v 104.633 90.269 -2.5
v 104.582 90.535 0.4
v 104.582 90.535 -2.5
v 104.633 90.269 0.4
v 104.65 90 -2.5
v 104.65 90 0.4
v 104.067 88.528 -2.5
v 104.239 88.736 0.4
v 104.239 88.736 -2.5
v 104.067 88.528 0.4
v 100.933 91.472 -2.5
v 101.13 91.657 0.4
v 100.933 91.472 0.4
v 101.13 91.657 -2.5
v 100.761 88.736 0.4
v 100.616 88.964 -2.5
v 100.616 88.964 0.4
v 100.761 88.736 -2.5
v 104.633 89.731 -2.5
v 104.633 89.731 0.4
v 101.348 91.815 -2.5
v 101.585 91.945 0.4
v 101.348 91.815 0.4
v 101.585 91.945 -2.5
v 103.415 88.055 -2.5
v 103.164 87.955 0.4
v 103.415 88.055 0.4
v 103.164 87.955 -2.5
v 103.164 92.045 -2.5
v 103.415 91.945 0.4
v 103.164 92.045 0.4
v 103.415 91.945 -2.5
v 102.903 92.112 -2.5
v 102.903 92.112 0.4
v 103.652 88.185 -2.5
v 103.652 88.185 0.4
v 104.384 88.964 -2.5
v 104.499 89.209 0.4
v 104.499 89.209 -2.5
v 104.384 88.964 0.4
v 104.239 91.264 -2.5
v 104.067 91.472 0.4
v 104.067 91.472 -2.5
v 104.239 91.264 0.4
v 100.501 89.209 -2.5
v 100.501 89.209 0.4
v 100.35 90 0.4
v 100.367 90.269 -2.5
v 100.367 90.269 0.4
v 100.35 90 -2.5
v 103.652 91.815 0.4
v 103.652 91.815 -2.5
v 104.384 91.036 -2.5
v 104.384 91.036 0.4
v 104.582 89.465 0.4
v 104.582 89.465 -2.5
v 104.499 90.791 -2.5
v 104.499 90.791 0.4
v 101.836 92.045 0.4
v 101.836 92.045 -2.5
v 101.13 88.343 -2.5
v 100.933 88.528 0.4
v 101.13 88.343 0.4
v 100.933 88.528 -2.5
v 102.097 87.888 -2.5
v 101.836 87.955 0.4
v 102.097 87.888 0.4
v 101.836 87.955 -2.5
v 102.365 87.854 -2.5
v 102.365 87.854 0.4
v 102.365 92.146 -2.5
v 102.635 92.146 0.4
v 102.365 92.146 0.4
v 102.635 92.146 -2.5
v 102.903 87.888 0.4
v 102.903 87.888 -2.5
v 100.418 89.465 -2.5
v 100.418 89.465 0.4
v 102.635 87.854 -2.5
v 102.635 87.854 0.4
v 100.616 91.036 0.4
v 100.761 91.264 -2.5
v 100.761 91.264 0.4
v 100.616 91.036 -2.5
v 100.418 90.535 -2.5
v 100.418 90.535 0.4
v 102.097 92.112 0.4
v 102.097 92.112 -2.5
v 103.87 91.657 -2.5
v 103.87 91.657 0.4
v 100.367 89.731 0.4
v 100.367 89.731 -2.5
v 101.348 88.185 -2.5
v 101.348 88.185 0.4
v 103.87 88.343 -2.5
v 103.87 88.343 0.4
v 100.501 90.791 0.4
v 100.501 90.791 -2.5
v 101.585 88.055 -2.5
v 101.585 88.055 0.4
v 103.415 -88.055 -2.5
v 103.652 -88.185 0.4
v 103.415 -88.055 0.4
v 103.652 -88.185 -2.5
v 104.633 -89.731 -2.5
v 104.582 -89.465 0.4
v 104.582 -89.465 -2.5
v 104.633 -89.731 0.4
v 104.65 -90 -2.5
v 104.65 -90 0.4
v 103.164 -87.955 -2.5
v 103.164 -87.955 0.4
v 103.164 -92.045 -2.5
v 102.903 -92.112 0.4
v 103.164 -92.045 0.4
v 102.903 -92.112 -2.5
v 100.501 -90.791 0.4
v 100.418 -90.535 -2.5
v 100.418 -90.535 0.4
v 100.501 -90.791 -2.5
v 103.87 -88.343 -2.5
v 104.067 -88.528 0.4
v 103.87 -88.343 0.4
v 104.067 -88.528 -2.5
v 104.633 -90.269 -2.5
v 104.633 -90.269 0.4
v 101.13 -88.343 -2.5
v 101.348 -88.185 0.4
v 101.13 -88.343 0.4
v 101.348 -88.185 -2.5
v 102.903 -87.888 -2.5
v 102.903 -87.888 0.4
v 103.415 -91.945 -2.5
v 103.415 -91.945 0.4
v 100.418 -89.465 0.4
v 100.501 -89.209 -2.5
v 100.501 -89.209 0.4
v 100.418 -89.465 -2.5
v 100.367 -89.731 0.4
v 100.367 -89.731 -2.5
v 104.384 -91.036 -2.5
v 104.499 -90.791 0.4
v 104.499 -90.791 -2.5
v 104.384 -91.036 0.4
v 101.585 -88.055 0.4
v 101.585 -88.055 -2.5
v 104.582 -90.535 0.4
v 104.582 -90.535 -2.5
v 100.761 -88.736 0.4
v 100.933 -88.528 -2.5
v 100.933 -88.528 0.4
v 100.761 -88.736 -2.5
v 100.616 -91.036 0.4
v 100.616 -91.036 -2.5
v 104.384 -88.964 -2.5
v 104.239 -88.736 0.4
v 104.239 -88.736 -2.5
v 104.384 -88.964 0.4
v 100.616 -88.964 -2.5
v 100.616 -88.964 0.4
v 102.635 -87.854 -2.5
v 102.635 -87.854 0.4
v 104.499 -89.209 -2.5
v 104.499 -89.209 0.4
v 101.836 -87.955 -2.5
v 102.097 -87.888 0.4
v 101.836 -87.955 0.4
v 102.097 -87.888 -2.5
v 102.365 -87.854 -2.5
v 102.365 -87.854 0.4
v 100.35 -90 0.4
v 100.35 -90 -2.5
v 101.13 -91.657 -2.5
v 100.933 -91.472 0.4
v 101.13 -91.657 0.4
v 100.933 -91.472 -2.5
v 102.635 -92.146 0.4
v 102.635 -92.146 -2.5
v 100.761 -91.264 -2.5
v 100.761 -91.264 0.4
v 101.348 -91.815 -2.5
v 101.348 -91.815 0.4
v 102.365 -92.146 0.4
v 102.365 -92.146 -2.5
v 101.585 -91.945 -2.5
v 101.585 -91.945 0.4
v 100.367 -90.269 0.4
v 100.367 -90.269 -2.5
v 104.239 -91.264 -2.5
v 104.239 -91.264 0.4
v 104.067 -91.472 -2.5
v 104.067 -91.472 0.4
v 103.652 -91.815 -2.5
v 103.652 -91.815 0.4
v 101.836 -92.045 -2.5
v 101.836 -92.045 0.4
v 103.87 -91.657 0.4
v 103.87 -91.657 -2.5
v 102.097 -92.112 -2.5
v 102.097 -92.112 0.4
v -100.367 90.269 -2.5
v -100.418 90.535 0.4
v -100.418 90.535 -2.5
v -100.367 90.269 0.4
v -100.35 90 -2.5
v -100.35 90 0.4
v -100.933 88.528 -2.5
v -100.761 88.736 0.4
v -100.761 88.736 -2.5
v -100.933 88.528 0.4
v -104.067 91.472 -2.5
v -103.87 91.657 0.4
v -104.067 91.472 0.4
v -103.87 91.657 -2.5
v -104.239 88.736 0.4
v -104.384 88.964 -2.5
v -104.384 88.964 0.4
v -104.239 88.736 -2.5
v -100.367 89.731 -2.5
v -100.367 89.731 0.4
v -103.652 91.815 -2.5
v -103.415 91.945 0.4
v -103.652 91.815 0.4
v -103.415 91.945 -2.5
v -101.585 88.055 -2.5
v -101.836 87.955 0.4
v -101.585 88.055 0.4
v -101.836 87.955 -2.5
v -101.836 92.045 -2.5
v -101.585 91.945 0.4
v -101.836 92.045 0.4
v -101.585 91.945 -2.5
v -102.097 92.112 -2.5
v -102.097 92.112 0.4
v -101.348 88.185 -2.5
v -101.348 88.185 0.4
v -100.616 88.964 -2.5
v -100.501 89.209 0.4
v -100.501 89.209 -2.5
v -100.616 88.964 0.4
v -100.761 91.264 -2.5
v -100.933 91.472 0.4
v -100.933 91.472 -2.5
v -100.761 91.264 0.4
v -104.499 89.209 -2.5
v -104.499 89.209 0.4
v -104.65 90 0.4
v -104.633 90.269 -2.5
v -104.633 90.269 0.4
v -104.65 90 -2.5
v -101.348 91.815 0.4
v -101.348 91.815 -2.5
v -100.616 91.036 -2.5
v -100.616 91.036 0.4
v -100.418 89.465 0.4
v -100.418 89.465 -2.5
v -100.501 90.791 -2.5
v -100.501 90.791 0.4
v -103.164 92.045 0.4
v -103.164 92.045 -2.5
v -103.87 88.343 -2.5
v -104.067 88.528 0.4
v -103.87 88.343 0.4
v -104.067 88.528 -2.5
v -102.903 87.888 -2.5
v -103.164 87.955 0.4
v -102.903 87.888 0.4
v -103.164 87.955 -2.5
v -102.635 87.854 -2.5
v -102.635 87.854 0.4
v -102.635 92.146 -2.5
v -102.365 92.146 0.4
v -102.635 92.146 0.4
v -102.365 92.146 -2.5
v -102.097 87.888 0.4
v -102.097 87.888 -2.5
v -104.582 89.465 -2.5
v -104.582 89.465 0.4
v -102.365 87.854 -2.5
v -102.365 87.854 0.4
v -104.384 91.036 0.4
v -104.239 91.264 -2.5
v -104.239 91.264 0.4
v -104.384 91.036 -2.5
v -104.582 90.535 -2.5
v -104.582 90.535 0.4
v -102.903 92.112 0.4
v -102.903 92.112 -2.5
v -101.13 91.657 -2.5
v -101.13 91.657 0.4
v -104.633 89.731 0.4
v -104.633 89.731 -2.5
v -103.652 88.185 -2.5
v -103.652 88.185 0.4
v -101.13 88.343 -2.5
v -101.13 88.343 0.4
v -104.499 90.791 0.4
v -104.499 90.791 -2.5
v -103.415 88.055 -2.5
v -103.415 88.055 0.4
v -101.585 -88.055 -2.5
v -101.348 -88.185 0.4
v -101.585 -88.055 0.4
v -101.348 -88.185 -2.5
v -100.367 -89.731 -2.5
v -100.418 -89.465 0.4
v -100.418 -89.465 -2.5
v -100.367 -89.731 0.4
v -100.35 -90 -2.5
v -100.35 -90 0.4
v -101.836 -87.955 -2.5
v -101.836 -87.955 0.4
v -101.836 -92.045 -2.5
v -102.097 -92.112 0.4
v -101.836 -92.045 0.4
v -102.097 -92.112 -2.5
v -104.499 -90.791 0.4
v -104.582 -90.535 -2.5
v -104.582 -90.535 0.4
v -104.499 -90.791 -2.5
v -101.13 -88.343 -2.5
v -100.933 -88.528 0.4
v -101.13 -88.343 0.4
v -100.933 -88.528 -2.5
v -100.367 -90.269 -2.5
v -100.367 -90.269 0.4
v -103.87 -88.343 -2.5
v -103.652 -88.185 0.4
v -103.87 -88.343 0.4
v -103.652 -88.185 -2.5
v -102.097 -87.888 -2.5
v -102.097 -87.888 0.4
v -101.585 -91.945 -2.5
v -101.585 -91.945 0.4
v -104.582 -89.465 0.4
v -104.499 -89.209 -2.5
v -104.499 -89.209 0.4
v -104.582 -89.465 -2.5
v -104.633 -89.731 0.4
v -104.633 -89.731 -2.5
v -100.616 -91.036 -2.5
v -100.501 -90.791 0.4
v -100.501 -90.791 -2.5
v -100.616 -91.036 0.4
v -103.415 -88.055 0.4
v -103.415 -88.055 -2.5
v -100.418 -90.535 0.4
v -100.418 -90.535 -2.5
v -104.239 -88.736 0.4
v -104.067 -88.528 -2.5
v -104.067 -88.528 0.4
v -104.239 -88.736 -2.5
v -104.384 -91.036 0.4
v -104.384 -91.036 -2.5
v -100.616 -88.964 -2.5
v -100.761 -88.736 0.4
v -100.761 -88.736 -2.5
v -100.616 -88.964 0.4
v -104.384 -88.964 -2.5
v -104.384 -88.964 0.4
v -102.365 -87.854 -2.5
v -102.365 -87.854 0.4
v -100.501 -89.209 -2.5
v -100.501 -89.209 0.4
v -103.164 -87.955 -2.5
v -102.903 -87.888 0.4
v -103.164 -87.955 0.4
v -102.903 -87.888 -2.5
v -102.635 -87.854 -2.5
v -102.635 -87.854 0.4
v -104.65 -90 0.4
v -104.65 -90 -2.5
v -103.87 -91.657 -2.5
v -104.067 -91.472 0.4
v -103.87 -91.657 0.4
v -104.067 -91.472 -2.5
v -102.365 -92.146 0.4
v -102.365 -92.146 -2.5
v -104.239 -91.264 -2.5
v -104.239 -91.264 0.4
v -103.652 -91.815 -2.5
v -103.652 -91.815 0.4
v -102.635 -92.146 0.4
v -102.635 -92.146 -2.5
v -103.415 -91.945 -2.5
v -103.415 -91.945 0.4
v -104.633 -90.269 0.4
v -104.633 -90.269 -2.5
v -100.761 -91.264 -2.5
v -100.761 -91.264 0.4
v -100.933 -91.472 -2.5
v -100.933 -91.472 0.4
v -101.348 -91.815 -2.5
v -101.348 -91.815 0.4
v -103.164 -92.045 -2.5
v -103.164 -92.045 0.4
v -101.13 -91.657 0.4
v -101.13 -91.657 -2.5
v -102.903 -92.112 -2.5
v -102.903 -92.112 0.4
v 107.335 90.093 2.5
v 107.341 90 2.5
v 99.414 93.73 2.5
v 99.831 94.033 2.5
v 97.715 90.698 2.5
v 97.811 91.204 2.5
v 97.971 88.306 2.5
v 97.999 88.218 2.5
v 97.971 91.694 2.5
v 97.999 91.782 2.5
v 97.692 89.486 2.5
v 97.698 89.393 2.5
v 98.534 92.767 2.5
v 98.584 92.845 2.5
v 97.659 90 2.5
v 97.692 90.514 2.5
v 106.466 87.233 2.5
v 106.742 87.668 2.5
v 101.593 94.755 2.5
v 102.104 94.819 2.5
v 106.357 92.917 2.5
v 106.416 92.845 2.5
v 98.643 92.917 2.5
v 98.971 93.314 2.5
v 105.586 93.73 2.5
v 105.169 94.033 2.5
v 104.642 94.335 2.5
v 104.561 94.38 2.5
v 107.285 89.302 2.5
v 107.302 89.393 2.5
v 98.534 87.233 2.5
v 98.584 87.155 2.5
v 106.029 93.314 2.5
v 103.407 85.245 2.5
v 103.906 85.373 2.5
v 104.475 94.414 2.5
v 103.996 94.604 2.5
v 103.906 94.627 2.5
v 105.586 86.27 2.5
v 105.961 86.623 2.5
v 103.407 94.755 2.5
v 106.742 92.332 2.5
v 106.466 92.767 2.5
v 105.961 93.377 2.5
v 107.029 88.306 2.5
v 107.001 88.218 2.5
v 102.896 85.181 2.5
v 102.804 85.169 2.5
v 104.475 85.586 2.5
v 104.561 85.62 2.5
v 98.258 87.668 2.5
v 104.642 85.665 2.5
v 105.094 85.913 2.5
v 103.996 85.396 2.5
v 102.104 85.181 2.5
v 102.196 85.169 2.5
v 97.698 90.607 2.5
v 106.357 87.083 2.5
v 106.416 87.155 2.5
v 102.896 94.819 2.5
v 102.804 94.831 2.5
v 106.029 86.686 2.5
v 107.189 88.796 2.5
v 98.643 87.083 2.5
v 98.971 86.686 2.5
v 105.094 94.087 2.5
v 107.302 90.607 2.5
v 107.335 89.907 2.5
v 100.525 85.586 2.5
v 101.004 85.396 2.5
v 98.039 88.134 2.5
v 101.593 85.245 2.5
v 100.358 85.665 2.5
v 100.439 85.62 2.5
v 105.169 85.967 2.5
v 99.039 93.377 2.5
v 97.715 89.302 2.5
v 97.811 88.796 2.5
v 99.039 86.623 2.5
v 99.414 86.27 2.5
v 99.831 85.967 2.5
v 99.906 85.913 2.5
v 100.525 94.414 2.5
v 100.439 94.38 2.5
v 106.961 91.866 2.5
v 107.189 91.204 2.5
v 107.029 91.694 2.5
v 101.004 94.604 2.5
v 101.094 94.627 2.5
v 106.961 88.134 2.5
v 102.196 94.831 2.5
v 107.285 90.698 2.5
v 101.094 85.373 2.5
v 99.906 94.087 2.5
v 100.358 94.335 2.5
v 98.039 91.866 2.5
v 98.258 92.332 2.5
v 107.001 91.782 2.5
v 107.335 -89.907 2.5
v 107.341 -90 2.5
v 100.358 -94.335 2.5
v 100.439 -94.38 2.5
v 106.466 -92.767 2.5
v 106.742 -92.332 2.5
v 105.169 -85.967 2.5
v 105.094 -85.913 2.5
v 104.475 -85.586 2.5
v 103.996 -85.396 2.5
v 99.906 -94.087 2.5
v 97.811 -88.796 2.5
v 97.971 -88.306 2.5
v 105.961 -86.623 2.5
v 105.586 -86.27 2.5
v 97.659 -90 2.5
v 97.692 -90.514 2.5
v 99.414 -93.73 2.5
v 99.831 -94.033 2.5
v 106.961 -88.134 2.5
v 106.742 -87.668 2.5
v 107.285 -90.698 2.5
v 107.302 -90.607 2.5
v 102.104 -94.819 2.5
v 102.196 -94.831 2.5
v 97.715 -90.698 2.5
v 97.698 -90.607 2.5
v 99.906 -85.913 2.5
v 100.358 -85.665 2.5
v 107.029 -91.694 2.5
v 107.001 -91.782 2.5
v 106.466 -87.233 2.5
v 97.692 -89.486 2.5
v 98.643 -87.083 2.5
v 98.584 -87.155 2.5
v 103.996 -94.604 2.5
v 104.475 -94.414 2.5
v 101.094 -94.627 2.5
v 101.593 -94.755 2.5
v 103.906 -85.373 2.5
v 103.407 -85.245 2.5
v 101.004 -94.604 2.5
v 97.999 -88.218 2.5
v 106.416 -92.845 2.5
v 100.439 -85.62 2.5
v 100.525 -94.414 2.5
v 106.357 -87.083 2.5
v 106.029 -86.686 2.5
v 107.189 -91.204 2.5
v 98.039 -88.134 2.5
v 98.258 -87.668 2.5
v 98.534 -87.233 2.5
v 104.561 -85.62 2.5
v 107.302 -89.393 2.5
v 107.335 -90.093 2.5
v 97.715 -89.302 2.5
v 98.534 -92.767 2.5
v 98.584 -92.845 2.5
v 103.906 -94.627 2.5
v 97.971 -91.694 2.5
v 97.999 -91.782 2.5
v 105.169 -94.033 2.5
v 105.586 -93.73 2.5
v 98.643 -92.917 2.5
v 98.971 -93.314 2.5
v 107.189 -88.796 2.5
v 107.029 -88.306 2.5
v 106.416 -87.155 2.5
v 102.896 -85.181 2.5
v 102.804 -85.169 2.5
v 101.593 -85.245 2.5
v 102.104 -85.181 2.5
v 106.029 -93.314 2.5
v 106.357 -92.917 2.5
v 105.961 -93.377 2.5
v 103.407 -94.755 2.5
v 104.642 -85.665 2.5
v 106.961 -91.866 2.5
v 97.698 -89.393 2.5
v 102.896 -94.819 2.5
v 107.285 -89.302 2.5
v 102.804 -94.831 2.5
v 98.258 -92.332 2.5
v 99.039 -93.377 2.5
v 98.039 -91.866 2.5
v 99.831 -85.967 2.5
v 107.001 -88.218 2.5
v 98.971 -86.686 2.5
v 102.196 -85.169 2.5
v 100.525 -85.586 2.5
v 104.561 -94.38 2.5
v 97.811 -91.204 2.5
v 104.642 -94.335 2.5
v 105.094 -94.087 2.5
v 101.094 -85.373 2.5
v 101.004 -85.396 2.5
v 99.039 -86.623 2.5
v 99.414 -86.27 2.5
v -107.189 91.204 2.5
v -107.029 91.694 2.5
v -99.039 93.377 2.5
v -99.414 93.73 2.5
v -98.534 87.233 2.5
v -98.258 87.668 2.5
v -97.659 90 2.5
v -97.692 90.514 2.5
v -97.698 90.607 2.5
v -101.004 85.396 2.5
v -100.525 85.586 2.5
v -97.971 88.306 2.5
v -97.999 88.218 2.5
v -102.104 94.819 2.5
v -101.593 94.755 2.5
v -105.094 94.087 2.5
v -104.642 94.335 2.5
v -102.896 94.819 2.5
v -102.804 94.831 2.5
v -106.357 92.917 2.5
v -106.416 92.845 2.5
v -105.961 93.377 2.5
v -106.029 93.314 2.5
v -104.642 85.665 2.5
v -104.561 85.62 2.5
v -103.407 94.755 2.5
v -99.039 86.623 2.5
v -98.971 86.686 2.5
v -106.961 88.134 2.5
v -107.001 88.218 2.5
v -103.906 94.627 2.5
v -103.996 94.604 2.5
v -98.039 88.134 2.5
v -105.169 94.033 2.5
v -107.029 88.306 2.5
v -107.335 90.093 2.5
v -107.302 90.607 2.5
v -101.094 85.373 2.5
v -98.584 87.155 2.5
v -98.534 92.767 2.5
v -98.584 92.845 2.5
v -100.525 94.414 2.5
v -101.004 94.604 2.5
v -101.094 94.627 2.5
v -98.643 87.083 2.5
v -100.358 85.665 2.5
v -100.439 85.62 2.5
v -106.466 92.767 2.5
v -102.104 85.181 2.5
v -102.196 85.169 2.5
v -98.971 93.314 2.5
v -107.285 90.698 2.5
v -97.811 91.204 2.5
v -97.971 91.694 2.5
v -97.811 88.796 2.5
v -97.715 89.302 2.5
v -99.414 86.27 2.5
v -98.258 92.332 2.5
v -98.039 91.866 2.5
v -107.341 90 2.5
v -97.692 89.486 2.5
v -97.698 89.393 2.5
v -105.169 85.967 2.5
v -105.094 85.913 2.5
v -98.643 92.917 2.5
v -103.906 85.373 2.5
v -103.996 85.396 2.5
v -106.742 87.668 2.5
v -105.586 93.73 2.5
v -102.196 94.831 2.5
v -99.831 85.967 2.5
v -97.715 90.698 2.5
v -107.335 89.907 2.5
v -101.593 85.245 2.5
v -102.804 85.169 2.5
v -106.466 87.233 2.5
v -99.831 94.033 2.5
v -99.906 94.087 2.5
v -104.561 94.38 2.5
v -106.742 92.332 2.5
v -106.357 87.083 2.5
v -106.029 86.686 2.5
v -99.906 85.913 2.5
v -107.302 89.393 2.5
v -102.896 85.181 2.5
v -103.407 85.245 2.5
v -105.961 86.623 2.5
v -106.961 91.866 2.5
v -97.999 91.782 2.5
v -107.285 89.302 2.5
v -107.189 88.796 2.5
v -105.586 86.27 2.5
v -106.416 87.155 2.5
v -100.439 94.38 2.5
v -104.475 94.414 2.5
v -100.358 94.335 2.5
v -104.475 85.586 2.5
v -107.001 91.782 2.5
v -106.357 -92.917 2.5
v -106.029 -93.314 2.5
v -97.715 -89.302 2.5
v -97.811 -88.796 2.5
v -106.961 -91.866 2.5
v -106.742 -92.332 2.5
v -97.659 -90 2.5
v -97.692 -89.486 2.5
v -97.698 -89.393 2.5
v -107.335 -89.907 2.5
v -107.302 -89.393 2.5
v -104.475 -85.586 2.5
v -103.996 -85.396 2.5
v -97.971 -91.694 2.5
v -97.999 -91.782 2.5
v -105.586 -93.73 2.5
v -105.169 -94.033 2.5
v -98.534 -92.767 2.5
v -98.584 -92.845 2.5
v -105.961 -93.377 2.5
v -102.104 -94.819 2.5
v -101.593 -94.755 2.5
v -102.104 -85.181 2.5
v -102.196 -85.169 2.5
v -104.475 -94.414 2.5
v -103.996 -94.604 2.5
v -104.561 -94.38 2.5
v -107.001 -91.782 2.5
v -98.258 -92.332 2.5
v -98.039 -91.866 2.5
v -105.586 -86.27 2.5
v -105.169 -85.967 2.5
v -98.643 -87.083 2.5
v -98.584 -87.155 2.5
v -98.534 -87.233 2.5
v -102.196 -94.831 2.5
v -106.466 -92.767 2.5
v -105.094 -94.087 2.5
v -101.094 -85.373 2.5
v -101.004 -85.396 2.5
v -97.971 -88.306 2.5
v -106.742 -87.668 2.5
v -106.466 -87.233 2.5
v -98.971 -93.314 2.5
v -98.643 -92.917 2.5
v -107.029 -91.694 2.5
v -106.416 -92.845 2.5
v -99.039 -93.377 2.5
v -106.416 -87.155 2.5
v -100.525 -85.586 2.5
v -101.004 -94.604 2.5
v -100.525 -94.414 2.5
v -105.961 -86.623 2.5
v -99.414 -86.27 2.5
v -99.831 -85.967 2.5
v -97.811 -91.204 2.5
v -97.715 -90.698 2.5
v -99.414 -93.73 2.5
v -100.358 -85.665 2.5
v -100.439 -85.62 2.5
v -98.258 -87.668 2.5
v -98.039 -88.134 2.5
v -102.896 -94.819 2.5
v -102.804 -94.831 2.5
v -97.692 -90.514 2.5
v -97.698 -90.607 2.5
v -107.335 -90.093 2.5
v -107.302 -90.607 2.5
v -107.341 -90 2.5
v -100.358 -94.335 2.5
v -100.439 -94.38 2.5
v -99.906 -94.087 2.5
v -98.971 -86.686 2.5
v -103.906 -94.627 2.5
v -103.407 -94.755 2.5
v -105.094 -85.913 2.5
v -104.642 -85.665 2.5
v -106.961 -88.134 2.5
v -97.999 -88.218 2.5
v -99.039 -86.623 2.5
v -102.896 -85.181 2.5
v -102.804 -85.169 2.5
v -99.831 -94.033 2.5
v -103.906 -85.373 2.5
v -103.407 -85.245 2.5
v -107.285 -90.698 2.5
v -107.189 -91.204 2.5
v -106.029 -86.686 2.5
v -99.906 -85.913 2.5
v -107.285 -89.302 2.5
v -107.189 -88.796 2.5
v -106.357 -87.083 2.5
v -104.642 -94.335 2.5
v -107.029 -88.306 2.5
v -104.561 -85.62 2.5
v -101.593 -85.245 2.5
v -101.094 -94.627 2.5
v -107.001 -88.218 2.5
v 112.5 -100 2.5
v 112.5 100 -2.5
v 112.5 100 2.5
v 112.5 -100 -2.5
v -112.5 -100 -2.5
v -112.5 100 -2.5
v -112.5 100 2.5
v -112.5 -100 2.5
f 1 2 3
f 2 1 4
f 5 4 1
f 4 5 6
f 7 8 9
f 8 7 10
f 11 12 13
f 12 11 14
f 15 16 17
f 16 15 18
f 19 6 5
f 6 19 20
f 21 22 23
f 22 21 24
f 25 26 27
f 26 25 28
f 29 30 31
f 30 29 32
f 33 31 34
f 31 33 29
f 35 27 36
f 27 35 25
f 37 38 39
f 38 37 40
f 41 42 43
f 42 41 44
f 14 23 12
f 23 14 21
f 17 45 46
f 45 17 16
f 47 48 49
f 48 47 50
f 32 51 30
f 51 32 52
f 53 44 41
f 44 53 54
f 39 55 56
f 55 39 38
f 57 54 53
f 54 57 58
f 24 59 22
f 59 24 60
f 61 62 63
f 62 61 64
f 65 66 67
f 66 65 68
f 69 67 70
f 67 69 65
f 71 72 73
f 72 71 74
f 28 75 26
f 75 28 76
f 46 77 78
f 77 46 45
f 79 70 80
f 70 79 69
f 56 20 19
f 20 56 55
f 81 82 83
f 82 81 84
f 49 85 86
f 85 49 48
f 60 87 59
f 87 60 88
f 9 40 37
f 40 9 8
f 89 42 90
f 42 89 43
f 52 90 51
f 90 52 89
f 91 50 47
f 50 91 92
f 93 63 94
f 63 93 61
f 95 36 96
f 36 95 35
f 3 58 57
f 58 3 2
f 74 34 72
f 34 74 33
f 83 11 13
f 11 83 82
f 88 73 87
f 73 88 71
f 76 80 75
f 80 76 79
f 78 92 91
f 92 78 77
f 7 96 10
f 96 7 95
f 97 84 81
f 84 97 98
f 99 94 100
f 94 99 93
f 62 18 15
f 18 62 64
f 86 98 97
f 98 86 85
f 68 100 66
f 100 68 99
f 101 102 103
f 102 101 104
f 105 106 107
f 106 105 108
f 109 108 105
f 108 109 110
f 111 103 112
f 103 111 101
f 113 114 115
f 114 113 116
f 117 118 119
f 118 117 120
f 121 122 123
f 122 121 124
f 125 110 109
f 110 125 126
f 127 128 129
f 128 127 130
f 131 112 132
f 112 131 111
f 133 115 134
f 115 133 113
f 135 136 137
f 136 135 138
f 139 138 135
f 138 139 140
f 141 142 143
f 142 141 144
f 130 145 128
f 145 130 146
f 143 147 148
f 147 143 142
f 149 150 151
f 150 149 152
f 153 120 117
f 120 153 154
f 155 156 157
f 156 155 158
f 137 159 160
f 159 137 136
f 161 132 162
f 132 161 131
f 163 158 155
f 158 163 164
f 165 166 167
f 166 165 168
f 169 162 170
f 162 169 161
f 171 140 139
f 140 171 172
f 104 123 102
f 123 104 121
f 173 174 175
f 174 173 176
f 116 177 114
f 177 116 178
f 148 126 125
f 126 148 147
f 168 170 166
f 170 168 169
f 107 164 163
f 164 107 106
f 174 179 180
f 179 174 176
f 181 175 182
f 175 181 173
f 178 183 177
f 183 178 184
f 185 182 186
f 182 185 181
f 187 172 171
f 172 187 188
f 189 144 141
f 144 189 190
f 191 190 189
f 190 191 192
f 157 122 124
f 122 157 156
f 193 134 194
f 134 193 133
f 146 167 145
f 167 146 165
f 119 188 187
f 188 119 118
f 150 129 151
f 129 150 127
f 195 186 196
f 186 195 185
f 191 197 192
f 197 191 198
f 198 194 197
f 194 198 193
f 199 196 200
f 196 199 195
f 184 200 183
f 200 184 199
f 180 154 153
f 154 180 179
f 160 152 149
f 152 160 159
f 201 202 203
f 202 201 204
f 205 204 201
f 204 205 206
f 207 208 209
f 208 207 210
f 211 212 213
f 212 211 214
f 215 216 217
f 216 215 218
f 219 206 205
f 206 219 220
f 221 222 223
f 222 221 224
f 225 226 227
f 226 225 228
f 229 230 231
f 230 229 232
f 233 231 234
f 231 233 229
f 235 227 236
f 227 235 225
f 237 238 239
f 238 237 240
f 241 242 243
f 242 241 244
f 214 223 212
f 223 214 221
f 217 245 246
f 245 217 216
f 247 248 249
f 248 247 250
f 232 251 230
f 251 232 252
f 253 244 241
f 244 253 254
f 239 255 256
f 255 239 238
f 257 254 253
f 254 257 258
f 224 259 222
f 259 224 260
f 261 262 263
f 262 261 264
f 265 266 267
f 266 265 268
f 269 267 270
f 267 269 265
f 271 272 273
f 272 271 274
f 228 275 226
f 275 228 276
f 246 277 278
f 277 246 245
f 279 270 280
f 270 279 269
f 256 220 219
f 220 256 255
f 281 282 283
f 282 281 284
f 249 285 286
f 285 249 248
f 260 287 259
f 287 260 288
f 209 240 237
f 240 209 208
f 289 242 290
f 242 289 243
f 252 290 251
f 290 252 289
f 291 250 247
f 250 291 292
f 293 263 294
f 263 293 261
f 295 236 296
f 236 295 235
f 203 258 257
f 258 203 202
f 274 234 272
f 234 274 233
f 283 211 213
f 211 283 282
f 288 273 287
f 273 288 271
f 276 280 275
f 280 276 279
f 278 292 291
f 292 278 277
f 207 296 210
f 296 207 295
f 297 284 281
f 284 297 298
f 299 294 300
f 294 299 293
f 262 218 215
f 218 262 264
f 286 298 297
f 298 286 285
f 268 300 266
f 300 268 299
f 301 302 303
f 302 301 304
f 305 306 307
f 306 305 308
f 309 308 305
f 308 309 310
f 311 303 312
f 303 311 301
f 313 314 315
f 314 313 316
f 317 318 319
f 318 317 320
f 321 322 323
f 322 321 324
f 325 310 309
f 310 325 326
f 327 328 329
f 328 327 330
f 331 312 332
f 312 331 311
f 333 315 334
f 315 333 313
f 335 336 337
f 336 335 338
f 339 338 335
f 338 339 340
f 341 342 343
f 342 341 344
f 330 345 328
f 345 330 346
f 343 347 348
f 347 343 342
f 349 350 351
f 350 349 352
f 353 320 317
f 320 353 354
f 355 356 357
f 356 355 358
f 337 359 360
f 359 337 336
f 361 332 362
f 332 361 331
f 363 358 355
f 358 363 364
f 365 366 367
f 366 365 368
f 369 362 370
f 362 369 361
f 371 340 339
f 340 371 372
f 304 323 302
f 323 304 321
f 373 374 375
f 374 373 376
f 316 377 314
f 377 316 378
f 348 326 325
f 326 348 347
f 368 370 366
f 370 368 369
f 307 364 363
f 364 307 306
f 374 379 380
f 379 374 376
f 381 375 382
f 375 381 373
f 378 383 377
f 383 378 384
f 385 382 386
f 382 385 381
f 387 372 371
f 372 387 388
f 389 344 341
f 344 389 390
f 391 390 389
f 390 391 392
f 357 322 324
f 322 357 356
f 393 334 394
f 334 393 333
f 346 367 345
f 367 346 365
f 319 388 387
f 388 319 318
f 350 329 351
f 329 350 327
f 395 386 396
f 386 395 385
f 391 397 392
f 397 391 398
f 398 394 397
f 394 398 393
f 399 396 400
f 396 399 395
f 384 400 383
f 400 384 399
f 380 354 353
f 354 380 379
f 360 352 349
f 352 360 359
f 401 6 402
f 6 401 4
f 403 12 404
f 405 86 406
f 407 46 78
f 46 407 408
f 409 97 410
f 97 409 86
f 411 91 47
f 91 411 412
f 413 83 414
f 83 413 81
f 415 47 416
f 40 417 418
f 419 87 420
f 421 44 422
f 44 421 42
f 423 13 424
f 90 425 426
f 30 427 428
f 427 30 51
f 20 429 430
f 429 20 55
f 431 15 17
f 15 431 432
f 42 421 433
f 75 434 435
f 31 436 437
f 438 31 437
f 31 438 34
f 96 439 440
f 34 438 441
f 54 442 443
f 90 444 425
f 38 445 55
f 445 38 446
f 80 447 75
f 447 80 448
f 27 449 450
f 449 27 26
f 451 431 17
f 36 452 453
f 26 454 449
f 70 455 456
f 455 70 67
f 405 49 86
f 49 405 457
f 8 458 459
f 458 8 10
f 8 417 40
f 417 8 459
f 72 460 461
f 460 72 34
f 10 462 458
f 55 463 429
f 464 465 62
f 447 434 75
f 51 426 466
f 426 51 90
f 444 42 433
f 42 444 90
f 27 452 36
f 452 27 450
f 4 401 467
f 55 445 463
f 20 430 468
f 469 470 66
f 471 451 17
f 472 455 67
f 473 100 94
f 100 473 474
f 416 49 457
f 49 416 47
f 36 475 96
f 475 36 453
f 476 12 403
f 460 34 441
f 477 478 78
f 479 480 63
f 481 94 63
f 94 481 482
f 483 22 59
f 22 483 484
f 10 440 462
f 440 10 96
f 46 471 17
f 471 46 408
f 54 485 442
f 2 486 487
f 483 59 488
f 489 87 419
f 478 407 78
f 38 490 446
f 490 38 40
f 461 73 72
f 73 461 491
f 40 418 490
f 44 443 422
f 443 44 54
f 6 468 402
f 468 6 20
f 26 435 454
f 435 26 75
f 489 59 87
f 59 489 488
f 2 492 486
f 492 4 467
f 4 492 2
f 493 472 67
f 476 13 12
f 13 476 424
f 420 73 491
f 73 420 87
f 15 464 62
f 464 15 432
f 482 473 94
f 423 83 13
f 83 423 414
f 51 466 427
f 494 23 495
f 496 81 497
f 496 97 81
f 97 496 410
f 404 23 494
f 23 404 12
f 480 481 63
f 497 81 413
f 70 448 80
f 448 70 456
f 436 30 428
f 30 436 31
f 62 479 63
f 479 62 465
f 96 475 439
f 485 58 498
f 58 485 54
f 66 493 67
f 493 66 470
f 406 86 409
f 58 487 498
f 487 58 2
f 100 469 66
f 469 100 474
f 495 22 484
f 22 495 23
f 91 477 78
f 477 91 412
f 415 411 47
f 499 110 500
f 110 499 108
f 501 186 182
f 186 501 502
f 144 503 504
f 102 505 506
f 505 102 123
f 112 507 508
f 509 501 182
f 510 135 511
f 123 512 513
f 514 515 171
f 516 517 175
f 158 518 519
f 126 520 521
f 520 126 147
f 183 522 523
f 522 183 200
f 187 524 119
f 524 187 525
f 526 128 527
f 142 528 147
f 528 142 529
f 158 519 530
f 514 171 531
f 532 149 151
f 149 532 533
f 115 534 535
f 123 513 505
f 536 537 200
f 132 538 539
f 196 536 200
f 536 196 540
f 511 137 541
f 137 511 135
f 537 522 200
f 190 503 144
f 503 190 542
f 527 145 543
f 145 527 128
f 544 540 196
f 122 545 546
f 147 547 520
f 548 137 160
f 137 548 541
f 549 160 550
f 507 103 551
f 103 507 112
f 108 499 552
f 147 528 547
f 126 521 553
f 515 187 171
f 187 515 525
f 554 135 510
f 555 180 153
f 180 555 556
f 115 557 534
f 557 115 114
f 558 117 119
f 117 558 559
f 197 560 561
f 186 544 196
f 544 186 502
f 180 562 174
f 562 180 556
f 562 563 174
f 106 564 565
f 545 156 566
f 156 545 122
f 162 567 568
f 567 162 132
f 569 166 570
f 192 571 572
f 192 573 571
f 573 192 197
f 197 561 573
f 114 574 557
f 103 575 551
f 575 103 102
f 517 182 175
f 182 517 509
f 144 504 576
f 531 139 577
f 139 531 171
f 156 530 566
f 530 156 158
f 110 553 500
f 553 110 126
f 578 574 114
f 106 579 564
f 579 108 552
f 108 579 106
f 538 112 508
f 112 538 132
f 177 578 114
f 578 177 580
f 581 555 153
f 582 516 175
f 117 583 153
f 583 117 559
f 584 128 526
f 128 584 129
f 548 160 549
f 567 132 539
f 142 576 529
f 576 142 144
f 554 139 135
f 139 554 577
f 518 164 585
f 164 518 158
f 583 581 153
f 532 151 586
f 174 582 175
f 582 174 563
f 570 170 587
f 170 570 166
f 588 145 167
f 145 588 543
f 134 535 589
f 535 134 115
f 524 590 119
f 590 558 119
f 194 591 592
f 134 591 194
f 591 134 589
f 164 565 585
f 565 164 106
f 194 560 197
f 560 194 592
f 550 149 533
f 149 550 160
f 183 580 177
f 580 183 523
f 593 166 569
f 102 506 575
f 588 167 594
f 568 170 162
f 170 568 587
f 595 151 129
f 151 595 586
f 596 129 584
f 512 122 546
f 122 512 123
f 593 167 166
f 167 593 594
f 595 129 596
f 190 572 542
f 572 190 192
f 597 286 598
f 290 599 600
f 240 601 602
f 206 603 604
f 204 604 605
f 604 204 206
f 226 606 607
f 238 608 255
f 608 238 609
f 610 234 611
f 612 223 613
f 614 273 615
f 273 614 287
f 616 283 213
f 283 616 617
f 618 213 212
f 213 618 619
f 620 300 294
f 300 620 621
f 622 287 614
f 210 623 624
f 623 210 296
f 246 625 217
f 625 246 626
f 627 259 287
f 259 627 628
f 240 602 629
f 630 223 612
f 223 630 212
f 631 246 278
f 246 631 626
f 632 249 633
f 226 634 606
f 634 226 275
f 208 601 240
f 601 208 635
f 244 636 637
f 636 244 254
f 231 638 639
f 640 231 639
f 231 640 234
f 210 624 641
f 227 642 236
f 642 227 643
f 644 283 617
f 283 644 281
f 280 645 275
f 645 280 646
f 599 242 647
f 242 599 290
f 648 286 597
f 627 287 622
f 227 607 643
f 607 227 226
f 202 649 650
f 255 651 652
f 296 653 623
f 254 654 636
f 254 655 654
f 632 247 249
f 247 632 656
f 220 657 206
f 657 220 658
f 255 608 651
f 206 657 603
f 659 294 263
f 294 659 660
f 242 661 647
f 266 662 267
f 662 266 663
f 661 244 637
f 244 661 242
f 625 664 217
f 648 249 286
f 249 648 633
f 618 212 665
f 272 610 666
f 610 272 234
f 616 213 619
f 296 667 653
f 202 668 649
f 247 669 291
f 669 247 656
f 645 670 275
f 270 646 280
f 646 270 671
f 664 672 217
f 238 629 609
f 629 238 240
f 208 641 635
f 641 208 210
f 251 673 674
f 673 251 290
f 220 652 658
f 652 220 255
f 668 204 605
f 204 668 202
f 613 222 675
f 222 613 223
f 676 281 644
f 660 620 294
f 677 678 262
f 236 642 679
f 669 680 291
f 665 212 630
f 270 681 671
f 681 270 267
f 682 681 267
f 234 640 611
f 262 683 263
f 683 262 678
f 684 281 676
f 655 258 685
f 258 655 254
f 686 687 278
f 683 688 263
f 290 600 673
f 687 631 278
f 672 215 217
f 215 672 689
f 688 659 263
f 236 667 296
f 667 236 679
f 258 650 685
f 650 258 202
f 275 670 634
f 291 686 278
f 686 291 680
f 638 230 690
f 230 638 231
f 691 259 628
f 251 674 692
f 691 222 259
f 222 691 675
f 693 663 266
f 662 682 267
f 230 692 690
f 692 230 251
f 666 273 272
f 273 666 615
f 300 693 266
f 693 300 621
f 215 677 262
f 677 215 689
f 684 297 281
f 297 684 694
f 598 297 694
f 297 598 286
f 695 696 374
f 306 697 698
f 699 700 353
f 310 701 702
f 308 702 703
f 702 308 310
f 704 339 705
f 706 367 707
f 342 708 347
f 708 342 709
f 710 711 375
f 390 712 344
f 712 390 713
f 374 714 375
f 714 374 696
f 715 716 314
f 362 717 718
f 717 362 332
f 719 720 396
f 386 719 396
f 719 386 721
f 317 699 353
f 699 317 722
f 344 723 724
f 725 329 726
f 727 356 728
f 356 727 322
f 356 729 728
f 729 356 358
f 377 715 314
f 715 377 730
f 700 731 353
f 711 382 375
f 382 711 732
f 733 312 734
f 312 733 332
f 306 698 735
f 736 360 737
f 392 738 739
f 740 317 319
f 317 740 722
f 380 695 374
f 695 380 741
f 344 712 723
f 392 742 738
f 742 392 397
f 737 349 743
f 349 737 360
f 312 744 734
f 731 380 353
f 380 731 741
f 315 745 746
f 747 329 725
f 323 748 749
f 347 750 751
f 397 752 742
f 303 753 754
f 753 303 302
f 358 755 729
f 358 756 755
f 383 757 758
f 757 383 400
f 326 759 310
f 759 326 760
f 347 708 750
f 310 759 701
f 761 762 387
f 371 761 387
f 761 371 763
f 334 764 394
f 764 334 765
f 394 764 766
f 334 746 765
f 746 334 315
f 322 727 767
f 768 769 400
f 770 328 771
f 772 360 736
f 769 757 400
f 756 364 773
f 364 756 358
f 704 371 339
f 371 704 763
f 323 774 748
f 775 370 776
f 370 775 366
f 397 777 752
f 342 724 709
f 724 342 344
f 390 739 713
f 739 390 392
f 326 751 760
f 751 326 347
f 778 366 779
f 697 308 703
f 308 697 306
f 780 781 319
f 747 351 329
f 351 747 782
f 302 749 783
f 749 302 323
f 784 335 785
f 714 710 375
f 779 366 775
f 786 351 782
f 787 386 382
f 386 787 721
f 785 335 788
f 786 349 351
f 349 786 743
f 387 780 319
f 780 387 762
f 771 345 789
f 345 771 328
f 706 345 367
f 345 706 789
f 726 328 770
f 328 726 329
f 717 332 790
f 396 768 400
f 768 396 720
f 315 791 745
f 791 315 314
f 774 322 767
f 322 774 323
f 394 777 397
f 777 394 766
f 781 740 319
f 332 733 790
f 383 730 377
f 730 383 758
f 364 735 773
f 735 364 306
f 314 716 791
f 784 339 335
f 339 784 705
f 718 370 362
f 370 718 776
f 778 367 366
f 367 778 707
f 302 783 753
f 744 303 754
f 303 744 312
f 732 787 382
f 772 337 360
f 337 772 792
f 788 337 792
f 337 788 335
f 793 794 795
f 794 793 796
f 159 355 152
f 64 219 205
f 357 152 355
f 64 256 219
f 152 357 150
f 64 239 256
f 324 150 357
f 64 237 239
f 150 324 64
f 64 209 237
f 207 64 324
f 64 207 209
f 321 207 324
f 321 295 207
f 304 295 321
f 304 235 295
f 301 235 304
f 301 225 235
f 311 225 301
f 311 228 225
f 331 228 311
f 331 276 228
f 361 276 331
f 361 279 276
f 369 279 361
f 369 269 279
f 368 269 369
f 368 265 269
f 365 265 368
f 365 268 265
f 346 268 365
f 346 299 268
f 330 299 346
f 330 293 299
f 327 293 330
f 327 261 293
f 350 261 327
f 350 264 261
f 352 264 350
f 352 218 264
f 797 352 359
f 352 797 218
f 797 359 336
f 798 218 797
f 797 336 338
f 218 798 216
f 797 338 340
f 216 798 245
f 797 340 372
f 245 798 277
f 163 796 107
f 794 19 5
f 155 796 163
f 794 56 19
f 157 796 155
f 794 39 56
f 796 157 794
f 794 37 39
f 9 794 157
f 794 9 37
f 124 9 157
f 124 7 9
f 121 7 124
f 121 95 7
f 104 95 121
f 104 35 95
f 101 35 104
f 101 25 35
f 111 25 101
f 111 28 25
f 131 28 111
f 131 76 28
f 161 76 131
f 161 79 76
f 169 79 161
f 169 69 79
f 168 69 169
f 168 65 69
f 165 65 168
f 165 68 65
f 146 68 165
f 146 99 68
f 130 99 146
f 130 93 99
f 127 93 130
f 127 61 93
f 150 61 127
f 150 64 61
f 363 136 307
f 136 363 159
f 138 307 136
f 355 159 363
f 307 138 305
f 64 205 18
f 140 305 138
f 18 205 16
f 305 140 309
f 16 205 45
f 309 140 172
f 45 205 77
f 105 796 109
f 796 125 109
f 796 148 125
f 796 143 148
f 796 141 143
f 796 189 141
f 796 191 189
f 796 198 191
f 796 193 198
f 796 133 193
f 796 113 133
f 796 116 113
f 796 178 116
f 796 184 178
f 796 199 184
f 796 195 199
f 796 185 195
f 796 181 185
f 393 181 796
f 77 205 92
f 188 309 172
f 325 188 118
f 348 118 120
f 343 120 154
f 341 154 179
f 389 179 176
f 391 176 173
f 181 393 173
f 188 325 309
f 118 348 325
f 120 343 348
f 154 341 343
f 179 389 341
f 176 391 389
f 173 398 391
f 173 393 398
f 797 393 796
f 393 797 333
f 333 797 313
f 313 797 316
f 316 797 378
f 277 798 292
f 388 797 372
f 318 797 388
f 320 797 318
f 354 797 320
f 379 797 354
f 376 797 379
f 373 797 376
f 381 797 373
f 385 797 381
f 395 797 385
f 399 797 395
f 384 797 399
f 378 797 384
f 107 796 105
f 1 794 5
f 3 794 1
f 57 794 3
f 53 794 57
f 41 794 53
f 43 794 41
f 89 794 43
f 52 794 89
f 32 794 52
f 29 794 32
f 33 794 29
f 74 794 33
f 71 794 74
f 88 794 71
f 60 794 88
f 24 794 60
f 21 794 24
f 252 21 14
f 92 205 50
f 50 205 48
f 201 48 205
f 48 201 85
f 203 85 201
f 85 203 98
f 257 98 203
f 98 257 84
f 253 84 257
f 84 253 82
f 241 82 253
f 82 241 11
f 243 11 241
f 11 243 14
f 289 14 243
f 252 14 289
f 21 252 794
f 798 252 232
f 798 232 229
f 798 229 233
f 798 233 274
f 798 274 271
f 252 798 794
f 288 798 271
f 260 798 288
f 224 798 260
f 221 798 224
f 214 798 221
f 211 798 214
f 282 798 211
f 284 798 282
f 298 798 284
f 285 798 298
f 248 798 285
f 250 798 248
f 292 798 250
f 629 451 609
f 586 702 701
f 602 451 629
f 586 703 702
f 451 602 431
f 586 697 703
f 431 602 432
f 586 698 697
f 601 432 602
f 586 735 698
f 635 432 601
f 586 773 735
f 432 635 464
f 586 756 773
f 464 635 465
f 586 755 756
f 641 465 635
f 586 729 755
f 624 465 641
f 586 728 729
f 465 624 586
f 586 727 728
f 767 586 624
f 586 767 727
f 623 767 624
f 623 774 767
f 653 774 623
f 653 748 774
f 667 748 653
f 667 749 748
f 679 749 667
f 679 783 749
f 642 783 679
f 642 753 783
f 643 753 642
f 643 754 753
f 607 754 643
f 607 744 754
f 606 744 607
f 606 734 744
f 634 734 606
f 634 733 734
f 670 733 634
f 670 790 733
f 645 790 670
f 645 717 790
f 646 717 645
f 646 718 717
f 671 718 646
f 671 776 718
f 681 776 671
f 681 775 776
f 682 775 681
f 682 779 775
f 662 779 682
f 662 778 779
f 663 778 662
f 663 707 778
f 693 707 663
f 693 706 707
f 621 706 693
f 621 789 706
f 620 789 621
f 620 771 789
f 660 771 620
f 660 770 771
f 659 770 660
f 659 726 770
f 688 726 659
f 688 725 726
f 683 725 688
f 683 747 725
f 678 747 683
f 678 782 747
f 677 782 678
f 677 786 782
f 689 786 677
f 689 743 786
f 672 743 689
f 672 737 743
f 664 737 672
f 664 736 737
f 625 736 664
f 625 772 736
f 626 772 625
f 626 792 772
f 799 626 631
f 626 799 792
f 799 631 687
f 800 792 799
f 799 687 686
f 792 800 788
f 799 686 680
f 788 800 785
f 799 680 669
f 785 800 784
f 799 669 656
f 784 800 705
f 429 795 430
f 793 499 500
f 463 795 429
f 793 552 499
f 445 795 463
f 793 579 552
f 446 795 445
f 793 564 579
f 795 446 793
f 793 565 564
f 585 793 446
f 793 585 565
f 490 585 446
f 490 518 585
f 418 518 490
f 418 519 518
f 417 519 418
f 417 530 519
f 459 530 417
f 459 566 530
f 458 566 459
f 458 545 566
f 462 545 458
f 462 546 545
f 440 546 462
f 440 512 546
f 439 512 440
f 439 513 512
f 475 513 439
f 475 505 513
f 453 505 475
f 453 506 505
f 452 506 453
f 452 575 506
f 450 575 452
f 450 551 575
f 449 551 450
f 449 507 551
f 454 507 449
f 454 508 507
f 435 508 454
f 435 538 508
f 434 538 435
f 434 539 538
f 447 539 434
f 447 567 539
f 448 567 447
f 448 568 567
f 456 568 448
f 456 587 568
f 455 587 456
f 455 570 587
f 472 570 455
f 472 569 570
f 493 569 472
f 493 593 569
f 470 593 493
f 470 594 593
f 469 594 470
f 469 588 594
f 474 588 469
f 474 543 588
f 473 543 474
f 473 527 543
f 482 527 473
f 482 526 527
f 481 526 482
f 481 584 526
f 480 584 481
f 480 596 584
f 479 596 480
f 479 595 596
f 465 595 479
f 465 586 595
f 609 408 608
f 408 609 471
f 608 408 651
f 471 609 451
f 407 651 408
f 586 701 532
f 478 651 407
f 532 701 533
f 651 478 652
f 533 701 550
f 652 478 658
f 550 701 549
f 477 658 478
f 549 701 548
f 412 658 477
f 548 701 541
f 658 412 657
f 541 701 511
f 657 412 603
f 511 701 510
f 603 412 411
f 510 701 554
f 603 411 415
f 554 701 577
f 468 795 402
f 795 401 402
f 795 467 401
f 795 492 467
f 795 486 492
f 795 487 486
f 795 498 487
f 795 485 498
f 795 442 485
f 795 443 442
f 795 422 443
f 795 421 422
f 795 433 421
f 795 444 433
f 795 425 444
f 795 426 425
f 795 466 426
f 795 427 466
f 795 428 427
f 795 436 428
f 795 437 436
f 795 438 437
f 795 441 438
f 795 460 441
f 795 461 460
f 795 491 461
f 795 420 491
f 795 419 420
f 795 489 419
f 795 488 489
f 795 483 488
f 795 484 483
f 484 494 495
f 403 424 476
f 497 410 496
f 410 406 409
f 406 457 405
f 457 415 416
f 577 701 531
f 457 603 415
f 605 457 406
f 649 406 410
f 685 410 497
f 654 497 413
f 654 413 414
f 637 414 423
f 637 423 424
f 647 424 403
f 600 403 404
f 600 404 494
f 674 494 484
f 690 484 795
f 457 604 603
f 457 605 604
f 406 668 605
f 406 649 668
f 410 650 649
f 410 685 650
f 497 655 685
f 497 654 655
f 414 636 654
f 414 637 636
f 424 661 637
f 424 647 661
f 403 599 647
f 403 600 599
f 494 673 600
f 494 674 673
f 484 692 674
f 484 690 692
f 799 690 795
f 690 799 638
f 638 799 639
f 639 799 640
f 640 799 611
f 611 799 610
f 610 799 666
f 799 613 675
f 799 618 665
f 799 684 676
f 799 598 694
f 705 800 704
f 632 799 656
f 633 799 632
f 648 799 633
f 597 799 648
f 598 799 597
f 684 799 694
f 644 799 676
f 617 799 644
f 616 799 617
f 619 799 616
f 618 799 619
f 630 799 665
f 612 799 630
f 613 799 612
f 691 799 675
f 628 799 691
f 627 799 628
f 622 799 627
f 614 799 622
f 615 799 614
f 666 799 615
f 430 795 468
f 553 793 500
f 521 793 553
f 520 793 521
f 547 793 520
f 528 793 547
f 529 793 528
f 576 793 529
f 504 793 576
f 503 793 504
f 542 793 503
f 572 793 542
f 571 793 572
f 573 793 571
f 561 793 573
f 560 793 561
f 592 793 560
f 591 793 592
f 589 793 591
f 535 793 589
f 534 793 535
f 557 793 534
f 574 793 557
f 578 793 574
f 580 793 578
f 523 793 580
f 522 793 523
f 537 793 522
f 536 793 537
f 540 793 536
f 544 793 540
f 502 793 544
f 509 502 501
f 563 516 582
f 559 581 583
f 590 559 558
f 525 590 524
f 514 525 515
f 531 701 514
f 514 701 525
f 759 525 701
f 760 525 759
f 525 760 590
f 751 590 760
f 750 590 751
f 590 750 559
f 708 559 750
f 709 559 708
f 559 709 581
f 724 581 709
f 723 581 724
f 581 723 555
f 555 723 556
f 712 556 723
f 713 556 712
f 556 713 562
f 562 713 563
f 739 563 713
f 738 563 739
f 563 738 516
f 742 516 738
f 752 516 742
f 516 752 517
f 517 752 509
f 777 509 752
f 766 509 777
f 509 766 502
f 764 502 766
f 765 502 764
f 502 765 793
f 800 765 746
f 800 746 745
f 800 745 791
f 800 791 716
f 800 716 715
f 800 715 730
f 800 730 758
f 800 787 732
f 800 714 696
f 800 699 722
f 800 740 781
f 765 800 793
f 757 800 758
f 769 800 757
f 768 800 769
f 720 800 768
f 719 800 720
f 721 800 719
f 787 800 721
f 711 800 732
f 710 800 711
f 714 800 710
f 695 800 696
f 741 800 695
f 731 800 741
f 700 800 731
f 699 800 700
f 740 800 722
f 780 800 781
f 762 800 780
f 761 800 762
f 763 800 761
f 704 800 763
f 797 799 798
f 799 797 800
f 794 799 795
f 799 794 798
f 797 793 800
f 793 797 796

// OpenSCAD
// file: roundedcube.scad
// More information: https://danielupshaw.com/openscad-rounded-corners/

// Set to 0.01 for higher definition curves (renders slower)
$fs = 0.15;

module roundedcube(size = [1, 1, 1], center = false, radius = 0.5, apply_to = "all") {
	// If single value, convert to [x, y, z] vector
	size = (size[0] == undef) ? [size, size, size] : size;

	translate_min = radius;
	translate_xmax = size[0] - radius;
	translate_ymax = size[1] - radius;
	translate_zmax = size[2] - radius;

	diameter = radius * 2;

	obj_translate = (center == false) ?
		[0, 0, 0] : [
			-(size[0] / 2),
			-(size[1] / 2),
			-(size[2] / 2)
		];

	translate(v = obj_translate) {
		hull() {
			for (translate_x = [translate_min, translate_xmax]) {
				x_at = (translate_x == translate_min) ? "min" : "max";
				for (translate_y = [translate_min, translate_ymax]) {
					y_at = (translate_y == translate_min) ? "min" : "max";
					for (translate_z = [translate_min, translate_zmax]) {
						z_at = (translate_z == translate_min) ? "min" : "max";

						translate(v = [translate_x, translate_y, translate_z])
						if (
							(apply_to == "all") ||
							(apply_to == "xmin" && x_at == "min") || (apply_to == "xmax" && x_at == "max") ||
							(apply_to == "ymin" && y_at == "min") || (apply_to == "ymax" && y_at == "max") ||
							(apply_to == "zmin" && z_at == "min") || (apply_to == "zmax" && z_at == "max")
						) {
							sphere(r = radius);
						} else {
							rotate = 
								(apply_to == "xmin" || apply_to == "xmax" || apply_to == "x") ? [0, 90, 0] : (
								(apply_to == "ymin" || apply_to == "ymax" || apply_to == "y") ? [90, 90, 0] :
								[0, 0, 0]
							);
							rotate(a = rotate)
							cylinder(h = diameter, r = radius, center = true);
						}
					}
				}
			}
		}
	}
}
// file: parameters.scad
/*
 * SPDX-FileCopyrightText: © 2023 Brian S. Stephan <bss@incorporeal.org>
 * SPDX-License-Identifier: GPL-3.0-or-later
 */

// adjustments
hole_tolerance = 0.15;

// M2
m2_screw_selftap_radius = 0.95;

// M3
m3_screw_selftap_radius = 1.3;

// M4
m4_bolt_radius = 2 + hole_tolerance;
m4_bolt_countersink_radius = 6.1 + hole_tolerance;
m4_bolt_hex_exterior_radius = 3.6 + hole_tolerance;

// 24mm button
small_button_radius = 12 + hole_tolerance;

// 30mm button
big_button_radius = 15 + hole_tolerance;

// JLF mount dimensions
lever_mount_x = 53;
lever_mount_y = 95;
lever_mount_z = 2;

// standard lever hole
lever_plate_hole = 12;

// case dimensions
// base frame box. reminder: top of inside (including mounts) is chopped by panel_z for plates
frame_x = 233;
frame_y = 208;
frame_z = 57;

frame_center_to_neutrik = 70;

// depth of the "lip" of the frame that the top plate sets into/supports the overhang
frame_wall = 4;

// per neutrik (mm)
neutrik_panel_thickness = 3;

// top plate, which can either be the whole plate ("inset") or the mounting frame for a plate that overhangs
panel_x = frame_x - (frame_wall * 2);
panel_y = frame_y - (frame_wall * 2);
panel_z = 5;

// how much the top plate x/y is expanded to overhang the frame
// note that this is relative to the top plate (so the wall is added back)
panel_overhang_amount = 8.5;
overhang_panel_x = panel_x + (frame_wall * 2) + (panel_overhang_amount * 2);
overhang_panel_y = panel_y + (frame_wall * 2) + (panel_overhang_amount * 2);

panel_to_frame_point_x = (panel_x/2)-10;
panel_to_frame_point_y = (panel_y/2)-10;

// frame interior that supports the top plates
panel_support_width = 5;

// neutrik D screw holes
neutrik_d_screw_radius = 1.6 + hole_tolerance;
neutrik_d_radius = 12 + hole_tolerance;

// additional button radius for decorative panels, etc.
decorative_radius_scale = 1.75;
jumbo_decorative_radius_scale = 2;
// main file
/*
 * SPDX-FileCopyrightText: © 2023 Brian S. Stephan <bss@incorporeal.org>
 * SPDX-License-Identifier: GPL-3.0-or-later
 */

include <parameters.scad>
include <components.scad>

module inset_bottom_panel() {
	mirror([0, 0, 1]) bottom_panel();
}

inset_bottom_panel();
